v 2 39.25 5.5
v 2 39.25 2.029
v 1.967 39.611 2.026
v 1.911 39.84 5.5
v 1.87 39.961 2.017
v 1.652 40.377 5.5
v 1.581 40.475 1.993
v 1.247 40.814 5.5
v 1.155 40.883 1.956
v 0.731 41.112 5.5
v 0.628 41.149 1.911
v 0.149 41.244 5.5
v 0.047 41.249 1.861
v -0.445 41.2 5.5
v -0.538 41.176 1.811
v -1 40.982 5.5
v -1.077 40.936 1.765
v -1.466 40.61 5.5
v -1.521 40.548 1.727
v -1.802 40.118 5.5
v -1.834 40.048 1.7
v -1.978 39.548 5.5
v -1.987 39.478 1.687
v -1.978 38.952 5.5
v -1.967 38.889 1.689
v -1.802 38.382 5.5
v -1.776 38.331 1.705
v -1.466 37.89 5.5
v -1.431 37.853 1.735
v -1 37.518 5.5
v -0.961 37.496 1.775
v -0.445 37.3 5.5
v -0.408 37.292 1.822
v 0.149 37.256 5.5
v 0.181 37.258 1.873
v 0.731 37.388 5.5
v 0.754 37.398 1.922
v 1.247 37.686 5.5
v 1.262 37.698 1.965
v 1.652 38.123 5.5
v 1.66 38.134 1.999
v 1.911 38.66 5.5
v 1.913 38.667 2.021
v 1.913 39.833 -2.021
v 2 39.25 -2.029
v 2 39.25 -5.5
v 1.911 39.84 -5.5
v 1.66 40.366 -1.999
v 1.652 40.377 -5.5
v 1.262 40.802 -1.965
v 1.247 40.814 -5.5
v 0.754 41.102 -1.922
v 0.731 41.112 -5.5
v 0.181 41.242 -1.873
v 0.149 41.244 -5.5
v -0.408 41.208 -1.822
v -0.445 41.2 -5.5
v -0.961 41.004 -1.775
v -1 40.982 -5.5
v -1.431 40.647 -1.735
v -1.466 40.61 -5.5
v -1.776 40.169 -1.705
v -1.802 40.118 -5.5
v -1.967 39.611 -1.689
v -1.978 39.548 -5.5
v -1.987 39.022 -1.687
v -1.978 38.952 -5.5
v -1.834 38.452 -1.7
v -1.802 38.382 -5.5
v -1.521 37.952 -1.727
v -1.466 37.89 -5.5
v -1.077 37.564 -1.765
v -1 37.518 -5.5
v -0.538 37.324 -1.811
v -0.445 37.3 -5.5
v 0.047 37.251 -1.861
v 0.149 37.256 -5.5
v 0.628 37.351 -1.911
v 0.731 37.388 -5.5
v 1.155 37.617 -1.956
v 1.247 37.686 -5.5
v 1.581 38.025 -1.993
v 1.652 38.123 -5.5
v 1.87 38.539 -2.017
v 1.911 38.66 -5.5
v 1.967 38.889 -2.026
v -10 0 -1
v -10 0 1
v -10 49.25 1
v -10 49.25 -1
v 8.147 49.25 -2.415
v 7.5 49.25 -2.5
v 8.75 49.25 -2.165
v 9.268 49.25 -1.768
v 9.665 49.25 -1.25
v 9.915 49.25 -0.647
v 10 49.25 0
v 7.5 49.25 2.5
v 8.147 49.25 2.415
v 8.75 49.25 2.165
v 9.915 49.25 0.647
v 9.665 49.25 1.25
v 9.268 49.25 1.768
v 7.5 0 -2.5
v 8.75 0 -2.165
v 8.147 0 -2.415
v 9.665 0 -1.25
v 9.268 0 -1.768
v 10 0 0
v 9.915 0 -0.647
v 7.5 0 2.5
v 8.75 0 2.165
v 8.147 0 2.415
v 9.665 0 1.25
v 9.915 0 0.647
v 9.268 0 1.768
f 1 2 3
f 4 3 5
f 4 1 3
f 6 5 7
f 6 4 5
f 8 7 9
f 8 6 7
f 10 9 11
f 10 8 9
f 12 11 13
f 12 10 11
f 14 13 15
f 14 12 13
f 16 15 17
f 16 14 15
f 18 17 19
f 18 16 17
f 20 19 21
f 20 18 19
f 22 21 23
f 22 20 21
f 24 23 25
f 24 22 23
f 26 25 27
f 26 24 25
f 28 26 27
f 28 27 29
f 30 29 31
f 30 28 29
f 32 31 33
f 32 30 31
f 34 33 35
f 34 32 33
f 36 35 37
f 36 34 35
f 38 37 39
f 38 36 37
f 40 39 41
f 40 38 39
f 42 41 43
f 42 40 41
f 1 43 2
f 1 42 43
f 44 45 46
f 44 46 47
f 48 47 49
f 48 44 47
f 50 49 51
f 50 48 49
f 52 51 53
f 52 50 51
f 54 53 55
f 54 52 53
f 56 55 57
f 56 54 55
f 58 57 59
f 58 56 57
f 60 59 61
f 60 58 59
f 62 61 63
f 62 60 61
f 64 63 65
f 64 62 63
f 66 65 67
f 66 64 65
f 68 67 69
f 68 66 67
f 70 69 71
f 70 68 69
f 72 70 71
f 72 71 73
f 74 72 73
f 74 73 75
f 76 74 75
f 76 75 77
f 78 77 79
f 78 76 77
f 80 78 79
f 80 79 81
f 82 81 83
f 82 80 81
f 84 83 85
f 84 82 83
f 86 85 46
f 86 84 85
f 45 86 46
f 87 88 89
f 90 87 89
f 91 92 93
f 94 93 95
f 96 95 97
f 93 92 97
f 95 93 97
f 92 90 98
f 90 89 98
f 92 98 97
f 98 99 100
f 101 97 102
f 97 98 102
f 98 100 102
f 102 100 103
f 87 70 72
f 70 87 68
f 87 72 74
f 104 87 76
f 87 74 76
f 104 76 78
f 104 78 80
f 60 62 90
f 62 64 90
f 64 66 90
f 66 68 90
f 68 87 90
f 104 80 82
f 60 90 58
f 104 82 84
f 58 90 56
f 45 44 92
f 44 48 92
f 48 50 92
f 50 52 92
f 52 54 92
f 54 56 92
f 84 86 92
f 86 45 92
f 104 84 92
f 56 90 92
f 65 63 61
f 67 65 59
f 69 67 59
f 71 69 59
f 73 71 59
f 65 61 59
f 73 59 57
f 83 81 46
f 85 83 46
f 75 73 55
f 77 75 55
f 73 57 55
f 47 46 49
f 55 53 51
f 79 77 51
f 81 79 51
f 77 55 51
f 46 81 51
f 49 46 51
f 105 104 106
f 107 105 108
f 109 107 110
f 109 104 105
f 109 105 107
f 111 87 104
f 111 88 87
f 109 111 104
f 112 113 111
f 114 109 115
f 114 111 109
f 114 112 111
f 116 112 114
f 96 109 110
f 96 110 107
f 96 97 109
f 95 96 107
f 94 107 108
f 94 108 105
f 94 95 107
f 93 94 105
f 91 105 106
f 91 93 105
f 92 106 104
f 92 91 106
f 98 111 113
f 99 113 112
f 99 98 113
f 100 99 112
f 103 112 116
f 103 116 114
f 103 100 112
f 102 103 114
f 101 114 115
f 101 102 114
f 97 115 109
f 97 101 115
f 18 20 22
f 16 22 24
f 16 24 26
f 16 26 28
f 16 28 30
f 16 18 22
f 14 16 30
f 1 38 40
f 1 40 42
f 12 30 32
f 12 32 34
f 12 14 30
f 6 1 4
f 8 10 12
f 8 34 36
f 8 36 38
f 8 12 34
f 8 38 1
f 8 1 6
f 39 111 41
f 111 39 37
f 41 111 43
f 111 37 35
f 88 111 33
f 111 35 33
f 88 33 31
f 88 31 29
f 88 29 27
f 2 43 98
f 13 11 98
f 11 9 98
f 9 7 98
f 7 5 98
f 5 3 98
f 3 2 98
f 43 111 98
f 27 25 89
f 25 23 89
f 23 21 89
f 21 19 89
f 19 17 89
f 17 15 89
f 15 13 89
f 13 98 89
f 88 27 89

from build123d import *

# Parameters (mm, degrees)
SKETCH1_W           = 20
SKETCH1_H           = 49.25
BOSS_EXTRUDE1_DEPTH = 2.5
FILLET3_R           = 2.5
CUT_EXTRUDE1_DEPTH  = 51.317119353
SKETCH14_R          = 2
BOSS_EXTRUDE2_DEPTH = 5.5


with BuildPart() as part:
    # Sketch1 → Boss-Extrude1 (new, symmetric)
    with BuildSketch(Plane.XY):
        with Locations((0, 24.625)):
            Rectangle(SKETCH1_W, SKETCH1_H)
    extrude(amount=BOSS_EXTRUDE1_DEPTH, both=True)

    # Fillet3
    fillet3_edges = [part.edges().sort_by_distance(p)[0] for p in [
        (10, 24.625, 2.5),
        (10, 24.625, -2.5),
    ]]
    fillet(fillet3_edges, radius=FILLET3_R - 0.0001)  # a hair under: the kernel refuses the full size

    # Sketch11 → Cut-Extrude1 (cut, through all)
    with BuildSketch(Plane(origin=(0, 49.25, 0), x_dir=(1, 0, 0), z_dir=(0, 1, 0))):
        Polygon((-10, 1), (7.5, 2.5), (-10, 2.5), align=None)
        Polygon((7.5, -2.5), (-10, -1), (-10, -2.5), align=None)
    extrude(amount=-CUT_EXTRUDE1_DEPTH, mode=Mode.SUBTRACT)

    # Sketch14 → Boss-Extrude2 (add, symmetric)
    with BuildSketch(Plane.XY):
        with Locations((0, 39.25)):
            Circle(SKETCH14_R)
    extrude(amount=BOSS_EXTRUDE2_DEPTH, both=True)


solid = part.part
